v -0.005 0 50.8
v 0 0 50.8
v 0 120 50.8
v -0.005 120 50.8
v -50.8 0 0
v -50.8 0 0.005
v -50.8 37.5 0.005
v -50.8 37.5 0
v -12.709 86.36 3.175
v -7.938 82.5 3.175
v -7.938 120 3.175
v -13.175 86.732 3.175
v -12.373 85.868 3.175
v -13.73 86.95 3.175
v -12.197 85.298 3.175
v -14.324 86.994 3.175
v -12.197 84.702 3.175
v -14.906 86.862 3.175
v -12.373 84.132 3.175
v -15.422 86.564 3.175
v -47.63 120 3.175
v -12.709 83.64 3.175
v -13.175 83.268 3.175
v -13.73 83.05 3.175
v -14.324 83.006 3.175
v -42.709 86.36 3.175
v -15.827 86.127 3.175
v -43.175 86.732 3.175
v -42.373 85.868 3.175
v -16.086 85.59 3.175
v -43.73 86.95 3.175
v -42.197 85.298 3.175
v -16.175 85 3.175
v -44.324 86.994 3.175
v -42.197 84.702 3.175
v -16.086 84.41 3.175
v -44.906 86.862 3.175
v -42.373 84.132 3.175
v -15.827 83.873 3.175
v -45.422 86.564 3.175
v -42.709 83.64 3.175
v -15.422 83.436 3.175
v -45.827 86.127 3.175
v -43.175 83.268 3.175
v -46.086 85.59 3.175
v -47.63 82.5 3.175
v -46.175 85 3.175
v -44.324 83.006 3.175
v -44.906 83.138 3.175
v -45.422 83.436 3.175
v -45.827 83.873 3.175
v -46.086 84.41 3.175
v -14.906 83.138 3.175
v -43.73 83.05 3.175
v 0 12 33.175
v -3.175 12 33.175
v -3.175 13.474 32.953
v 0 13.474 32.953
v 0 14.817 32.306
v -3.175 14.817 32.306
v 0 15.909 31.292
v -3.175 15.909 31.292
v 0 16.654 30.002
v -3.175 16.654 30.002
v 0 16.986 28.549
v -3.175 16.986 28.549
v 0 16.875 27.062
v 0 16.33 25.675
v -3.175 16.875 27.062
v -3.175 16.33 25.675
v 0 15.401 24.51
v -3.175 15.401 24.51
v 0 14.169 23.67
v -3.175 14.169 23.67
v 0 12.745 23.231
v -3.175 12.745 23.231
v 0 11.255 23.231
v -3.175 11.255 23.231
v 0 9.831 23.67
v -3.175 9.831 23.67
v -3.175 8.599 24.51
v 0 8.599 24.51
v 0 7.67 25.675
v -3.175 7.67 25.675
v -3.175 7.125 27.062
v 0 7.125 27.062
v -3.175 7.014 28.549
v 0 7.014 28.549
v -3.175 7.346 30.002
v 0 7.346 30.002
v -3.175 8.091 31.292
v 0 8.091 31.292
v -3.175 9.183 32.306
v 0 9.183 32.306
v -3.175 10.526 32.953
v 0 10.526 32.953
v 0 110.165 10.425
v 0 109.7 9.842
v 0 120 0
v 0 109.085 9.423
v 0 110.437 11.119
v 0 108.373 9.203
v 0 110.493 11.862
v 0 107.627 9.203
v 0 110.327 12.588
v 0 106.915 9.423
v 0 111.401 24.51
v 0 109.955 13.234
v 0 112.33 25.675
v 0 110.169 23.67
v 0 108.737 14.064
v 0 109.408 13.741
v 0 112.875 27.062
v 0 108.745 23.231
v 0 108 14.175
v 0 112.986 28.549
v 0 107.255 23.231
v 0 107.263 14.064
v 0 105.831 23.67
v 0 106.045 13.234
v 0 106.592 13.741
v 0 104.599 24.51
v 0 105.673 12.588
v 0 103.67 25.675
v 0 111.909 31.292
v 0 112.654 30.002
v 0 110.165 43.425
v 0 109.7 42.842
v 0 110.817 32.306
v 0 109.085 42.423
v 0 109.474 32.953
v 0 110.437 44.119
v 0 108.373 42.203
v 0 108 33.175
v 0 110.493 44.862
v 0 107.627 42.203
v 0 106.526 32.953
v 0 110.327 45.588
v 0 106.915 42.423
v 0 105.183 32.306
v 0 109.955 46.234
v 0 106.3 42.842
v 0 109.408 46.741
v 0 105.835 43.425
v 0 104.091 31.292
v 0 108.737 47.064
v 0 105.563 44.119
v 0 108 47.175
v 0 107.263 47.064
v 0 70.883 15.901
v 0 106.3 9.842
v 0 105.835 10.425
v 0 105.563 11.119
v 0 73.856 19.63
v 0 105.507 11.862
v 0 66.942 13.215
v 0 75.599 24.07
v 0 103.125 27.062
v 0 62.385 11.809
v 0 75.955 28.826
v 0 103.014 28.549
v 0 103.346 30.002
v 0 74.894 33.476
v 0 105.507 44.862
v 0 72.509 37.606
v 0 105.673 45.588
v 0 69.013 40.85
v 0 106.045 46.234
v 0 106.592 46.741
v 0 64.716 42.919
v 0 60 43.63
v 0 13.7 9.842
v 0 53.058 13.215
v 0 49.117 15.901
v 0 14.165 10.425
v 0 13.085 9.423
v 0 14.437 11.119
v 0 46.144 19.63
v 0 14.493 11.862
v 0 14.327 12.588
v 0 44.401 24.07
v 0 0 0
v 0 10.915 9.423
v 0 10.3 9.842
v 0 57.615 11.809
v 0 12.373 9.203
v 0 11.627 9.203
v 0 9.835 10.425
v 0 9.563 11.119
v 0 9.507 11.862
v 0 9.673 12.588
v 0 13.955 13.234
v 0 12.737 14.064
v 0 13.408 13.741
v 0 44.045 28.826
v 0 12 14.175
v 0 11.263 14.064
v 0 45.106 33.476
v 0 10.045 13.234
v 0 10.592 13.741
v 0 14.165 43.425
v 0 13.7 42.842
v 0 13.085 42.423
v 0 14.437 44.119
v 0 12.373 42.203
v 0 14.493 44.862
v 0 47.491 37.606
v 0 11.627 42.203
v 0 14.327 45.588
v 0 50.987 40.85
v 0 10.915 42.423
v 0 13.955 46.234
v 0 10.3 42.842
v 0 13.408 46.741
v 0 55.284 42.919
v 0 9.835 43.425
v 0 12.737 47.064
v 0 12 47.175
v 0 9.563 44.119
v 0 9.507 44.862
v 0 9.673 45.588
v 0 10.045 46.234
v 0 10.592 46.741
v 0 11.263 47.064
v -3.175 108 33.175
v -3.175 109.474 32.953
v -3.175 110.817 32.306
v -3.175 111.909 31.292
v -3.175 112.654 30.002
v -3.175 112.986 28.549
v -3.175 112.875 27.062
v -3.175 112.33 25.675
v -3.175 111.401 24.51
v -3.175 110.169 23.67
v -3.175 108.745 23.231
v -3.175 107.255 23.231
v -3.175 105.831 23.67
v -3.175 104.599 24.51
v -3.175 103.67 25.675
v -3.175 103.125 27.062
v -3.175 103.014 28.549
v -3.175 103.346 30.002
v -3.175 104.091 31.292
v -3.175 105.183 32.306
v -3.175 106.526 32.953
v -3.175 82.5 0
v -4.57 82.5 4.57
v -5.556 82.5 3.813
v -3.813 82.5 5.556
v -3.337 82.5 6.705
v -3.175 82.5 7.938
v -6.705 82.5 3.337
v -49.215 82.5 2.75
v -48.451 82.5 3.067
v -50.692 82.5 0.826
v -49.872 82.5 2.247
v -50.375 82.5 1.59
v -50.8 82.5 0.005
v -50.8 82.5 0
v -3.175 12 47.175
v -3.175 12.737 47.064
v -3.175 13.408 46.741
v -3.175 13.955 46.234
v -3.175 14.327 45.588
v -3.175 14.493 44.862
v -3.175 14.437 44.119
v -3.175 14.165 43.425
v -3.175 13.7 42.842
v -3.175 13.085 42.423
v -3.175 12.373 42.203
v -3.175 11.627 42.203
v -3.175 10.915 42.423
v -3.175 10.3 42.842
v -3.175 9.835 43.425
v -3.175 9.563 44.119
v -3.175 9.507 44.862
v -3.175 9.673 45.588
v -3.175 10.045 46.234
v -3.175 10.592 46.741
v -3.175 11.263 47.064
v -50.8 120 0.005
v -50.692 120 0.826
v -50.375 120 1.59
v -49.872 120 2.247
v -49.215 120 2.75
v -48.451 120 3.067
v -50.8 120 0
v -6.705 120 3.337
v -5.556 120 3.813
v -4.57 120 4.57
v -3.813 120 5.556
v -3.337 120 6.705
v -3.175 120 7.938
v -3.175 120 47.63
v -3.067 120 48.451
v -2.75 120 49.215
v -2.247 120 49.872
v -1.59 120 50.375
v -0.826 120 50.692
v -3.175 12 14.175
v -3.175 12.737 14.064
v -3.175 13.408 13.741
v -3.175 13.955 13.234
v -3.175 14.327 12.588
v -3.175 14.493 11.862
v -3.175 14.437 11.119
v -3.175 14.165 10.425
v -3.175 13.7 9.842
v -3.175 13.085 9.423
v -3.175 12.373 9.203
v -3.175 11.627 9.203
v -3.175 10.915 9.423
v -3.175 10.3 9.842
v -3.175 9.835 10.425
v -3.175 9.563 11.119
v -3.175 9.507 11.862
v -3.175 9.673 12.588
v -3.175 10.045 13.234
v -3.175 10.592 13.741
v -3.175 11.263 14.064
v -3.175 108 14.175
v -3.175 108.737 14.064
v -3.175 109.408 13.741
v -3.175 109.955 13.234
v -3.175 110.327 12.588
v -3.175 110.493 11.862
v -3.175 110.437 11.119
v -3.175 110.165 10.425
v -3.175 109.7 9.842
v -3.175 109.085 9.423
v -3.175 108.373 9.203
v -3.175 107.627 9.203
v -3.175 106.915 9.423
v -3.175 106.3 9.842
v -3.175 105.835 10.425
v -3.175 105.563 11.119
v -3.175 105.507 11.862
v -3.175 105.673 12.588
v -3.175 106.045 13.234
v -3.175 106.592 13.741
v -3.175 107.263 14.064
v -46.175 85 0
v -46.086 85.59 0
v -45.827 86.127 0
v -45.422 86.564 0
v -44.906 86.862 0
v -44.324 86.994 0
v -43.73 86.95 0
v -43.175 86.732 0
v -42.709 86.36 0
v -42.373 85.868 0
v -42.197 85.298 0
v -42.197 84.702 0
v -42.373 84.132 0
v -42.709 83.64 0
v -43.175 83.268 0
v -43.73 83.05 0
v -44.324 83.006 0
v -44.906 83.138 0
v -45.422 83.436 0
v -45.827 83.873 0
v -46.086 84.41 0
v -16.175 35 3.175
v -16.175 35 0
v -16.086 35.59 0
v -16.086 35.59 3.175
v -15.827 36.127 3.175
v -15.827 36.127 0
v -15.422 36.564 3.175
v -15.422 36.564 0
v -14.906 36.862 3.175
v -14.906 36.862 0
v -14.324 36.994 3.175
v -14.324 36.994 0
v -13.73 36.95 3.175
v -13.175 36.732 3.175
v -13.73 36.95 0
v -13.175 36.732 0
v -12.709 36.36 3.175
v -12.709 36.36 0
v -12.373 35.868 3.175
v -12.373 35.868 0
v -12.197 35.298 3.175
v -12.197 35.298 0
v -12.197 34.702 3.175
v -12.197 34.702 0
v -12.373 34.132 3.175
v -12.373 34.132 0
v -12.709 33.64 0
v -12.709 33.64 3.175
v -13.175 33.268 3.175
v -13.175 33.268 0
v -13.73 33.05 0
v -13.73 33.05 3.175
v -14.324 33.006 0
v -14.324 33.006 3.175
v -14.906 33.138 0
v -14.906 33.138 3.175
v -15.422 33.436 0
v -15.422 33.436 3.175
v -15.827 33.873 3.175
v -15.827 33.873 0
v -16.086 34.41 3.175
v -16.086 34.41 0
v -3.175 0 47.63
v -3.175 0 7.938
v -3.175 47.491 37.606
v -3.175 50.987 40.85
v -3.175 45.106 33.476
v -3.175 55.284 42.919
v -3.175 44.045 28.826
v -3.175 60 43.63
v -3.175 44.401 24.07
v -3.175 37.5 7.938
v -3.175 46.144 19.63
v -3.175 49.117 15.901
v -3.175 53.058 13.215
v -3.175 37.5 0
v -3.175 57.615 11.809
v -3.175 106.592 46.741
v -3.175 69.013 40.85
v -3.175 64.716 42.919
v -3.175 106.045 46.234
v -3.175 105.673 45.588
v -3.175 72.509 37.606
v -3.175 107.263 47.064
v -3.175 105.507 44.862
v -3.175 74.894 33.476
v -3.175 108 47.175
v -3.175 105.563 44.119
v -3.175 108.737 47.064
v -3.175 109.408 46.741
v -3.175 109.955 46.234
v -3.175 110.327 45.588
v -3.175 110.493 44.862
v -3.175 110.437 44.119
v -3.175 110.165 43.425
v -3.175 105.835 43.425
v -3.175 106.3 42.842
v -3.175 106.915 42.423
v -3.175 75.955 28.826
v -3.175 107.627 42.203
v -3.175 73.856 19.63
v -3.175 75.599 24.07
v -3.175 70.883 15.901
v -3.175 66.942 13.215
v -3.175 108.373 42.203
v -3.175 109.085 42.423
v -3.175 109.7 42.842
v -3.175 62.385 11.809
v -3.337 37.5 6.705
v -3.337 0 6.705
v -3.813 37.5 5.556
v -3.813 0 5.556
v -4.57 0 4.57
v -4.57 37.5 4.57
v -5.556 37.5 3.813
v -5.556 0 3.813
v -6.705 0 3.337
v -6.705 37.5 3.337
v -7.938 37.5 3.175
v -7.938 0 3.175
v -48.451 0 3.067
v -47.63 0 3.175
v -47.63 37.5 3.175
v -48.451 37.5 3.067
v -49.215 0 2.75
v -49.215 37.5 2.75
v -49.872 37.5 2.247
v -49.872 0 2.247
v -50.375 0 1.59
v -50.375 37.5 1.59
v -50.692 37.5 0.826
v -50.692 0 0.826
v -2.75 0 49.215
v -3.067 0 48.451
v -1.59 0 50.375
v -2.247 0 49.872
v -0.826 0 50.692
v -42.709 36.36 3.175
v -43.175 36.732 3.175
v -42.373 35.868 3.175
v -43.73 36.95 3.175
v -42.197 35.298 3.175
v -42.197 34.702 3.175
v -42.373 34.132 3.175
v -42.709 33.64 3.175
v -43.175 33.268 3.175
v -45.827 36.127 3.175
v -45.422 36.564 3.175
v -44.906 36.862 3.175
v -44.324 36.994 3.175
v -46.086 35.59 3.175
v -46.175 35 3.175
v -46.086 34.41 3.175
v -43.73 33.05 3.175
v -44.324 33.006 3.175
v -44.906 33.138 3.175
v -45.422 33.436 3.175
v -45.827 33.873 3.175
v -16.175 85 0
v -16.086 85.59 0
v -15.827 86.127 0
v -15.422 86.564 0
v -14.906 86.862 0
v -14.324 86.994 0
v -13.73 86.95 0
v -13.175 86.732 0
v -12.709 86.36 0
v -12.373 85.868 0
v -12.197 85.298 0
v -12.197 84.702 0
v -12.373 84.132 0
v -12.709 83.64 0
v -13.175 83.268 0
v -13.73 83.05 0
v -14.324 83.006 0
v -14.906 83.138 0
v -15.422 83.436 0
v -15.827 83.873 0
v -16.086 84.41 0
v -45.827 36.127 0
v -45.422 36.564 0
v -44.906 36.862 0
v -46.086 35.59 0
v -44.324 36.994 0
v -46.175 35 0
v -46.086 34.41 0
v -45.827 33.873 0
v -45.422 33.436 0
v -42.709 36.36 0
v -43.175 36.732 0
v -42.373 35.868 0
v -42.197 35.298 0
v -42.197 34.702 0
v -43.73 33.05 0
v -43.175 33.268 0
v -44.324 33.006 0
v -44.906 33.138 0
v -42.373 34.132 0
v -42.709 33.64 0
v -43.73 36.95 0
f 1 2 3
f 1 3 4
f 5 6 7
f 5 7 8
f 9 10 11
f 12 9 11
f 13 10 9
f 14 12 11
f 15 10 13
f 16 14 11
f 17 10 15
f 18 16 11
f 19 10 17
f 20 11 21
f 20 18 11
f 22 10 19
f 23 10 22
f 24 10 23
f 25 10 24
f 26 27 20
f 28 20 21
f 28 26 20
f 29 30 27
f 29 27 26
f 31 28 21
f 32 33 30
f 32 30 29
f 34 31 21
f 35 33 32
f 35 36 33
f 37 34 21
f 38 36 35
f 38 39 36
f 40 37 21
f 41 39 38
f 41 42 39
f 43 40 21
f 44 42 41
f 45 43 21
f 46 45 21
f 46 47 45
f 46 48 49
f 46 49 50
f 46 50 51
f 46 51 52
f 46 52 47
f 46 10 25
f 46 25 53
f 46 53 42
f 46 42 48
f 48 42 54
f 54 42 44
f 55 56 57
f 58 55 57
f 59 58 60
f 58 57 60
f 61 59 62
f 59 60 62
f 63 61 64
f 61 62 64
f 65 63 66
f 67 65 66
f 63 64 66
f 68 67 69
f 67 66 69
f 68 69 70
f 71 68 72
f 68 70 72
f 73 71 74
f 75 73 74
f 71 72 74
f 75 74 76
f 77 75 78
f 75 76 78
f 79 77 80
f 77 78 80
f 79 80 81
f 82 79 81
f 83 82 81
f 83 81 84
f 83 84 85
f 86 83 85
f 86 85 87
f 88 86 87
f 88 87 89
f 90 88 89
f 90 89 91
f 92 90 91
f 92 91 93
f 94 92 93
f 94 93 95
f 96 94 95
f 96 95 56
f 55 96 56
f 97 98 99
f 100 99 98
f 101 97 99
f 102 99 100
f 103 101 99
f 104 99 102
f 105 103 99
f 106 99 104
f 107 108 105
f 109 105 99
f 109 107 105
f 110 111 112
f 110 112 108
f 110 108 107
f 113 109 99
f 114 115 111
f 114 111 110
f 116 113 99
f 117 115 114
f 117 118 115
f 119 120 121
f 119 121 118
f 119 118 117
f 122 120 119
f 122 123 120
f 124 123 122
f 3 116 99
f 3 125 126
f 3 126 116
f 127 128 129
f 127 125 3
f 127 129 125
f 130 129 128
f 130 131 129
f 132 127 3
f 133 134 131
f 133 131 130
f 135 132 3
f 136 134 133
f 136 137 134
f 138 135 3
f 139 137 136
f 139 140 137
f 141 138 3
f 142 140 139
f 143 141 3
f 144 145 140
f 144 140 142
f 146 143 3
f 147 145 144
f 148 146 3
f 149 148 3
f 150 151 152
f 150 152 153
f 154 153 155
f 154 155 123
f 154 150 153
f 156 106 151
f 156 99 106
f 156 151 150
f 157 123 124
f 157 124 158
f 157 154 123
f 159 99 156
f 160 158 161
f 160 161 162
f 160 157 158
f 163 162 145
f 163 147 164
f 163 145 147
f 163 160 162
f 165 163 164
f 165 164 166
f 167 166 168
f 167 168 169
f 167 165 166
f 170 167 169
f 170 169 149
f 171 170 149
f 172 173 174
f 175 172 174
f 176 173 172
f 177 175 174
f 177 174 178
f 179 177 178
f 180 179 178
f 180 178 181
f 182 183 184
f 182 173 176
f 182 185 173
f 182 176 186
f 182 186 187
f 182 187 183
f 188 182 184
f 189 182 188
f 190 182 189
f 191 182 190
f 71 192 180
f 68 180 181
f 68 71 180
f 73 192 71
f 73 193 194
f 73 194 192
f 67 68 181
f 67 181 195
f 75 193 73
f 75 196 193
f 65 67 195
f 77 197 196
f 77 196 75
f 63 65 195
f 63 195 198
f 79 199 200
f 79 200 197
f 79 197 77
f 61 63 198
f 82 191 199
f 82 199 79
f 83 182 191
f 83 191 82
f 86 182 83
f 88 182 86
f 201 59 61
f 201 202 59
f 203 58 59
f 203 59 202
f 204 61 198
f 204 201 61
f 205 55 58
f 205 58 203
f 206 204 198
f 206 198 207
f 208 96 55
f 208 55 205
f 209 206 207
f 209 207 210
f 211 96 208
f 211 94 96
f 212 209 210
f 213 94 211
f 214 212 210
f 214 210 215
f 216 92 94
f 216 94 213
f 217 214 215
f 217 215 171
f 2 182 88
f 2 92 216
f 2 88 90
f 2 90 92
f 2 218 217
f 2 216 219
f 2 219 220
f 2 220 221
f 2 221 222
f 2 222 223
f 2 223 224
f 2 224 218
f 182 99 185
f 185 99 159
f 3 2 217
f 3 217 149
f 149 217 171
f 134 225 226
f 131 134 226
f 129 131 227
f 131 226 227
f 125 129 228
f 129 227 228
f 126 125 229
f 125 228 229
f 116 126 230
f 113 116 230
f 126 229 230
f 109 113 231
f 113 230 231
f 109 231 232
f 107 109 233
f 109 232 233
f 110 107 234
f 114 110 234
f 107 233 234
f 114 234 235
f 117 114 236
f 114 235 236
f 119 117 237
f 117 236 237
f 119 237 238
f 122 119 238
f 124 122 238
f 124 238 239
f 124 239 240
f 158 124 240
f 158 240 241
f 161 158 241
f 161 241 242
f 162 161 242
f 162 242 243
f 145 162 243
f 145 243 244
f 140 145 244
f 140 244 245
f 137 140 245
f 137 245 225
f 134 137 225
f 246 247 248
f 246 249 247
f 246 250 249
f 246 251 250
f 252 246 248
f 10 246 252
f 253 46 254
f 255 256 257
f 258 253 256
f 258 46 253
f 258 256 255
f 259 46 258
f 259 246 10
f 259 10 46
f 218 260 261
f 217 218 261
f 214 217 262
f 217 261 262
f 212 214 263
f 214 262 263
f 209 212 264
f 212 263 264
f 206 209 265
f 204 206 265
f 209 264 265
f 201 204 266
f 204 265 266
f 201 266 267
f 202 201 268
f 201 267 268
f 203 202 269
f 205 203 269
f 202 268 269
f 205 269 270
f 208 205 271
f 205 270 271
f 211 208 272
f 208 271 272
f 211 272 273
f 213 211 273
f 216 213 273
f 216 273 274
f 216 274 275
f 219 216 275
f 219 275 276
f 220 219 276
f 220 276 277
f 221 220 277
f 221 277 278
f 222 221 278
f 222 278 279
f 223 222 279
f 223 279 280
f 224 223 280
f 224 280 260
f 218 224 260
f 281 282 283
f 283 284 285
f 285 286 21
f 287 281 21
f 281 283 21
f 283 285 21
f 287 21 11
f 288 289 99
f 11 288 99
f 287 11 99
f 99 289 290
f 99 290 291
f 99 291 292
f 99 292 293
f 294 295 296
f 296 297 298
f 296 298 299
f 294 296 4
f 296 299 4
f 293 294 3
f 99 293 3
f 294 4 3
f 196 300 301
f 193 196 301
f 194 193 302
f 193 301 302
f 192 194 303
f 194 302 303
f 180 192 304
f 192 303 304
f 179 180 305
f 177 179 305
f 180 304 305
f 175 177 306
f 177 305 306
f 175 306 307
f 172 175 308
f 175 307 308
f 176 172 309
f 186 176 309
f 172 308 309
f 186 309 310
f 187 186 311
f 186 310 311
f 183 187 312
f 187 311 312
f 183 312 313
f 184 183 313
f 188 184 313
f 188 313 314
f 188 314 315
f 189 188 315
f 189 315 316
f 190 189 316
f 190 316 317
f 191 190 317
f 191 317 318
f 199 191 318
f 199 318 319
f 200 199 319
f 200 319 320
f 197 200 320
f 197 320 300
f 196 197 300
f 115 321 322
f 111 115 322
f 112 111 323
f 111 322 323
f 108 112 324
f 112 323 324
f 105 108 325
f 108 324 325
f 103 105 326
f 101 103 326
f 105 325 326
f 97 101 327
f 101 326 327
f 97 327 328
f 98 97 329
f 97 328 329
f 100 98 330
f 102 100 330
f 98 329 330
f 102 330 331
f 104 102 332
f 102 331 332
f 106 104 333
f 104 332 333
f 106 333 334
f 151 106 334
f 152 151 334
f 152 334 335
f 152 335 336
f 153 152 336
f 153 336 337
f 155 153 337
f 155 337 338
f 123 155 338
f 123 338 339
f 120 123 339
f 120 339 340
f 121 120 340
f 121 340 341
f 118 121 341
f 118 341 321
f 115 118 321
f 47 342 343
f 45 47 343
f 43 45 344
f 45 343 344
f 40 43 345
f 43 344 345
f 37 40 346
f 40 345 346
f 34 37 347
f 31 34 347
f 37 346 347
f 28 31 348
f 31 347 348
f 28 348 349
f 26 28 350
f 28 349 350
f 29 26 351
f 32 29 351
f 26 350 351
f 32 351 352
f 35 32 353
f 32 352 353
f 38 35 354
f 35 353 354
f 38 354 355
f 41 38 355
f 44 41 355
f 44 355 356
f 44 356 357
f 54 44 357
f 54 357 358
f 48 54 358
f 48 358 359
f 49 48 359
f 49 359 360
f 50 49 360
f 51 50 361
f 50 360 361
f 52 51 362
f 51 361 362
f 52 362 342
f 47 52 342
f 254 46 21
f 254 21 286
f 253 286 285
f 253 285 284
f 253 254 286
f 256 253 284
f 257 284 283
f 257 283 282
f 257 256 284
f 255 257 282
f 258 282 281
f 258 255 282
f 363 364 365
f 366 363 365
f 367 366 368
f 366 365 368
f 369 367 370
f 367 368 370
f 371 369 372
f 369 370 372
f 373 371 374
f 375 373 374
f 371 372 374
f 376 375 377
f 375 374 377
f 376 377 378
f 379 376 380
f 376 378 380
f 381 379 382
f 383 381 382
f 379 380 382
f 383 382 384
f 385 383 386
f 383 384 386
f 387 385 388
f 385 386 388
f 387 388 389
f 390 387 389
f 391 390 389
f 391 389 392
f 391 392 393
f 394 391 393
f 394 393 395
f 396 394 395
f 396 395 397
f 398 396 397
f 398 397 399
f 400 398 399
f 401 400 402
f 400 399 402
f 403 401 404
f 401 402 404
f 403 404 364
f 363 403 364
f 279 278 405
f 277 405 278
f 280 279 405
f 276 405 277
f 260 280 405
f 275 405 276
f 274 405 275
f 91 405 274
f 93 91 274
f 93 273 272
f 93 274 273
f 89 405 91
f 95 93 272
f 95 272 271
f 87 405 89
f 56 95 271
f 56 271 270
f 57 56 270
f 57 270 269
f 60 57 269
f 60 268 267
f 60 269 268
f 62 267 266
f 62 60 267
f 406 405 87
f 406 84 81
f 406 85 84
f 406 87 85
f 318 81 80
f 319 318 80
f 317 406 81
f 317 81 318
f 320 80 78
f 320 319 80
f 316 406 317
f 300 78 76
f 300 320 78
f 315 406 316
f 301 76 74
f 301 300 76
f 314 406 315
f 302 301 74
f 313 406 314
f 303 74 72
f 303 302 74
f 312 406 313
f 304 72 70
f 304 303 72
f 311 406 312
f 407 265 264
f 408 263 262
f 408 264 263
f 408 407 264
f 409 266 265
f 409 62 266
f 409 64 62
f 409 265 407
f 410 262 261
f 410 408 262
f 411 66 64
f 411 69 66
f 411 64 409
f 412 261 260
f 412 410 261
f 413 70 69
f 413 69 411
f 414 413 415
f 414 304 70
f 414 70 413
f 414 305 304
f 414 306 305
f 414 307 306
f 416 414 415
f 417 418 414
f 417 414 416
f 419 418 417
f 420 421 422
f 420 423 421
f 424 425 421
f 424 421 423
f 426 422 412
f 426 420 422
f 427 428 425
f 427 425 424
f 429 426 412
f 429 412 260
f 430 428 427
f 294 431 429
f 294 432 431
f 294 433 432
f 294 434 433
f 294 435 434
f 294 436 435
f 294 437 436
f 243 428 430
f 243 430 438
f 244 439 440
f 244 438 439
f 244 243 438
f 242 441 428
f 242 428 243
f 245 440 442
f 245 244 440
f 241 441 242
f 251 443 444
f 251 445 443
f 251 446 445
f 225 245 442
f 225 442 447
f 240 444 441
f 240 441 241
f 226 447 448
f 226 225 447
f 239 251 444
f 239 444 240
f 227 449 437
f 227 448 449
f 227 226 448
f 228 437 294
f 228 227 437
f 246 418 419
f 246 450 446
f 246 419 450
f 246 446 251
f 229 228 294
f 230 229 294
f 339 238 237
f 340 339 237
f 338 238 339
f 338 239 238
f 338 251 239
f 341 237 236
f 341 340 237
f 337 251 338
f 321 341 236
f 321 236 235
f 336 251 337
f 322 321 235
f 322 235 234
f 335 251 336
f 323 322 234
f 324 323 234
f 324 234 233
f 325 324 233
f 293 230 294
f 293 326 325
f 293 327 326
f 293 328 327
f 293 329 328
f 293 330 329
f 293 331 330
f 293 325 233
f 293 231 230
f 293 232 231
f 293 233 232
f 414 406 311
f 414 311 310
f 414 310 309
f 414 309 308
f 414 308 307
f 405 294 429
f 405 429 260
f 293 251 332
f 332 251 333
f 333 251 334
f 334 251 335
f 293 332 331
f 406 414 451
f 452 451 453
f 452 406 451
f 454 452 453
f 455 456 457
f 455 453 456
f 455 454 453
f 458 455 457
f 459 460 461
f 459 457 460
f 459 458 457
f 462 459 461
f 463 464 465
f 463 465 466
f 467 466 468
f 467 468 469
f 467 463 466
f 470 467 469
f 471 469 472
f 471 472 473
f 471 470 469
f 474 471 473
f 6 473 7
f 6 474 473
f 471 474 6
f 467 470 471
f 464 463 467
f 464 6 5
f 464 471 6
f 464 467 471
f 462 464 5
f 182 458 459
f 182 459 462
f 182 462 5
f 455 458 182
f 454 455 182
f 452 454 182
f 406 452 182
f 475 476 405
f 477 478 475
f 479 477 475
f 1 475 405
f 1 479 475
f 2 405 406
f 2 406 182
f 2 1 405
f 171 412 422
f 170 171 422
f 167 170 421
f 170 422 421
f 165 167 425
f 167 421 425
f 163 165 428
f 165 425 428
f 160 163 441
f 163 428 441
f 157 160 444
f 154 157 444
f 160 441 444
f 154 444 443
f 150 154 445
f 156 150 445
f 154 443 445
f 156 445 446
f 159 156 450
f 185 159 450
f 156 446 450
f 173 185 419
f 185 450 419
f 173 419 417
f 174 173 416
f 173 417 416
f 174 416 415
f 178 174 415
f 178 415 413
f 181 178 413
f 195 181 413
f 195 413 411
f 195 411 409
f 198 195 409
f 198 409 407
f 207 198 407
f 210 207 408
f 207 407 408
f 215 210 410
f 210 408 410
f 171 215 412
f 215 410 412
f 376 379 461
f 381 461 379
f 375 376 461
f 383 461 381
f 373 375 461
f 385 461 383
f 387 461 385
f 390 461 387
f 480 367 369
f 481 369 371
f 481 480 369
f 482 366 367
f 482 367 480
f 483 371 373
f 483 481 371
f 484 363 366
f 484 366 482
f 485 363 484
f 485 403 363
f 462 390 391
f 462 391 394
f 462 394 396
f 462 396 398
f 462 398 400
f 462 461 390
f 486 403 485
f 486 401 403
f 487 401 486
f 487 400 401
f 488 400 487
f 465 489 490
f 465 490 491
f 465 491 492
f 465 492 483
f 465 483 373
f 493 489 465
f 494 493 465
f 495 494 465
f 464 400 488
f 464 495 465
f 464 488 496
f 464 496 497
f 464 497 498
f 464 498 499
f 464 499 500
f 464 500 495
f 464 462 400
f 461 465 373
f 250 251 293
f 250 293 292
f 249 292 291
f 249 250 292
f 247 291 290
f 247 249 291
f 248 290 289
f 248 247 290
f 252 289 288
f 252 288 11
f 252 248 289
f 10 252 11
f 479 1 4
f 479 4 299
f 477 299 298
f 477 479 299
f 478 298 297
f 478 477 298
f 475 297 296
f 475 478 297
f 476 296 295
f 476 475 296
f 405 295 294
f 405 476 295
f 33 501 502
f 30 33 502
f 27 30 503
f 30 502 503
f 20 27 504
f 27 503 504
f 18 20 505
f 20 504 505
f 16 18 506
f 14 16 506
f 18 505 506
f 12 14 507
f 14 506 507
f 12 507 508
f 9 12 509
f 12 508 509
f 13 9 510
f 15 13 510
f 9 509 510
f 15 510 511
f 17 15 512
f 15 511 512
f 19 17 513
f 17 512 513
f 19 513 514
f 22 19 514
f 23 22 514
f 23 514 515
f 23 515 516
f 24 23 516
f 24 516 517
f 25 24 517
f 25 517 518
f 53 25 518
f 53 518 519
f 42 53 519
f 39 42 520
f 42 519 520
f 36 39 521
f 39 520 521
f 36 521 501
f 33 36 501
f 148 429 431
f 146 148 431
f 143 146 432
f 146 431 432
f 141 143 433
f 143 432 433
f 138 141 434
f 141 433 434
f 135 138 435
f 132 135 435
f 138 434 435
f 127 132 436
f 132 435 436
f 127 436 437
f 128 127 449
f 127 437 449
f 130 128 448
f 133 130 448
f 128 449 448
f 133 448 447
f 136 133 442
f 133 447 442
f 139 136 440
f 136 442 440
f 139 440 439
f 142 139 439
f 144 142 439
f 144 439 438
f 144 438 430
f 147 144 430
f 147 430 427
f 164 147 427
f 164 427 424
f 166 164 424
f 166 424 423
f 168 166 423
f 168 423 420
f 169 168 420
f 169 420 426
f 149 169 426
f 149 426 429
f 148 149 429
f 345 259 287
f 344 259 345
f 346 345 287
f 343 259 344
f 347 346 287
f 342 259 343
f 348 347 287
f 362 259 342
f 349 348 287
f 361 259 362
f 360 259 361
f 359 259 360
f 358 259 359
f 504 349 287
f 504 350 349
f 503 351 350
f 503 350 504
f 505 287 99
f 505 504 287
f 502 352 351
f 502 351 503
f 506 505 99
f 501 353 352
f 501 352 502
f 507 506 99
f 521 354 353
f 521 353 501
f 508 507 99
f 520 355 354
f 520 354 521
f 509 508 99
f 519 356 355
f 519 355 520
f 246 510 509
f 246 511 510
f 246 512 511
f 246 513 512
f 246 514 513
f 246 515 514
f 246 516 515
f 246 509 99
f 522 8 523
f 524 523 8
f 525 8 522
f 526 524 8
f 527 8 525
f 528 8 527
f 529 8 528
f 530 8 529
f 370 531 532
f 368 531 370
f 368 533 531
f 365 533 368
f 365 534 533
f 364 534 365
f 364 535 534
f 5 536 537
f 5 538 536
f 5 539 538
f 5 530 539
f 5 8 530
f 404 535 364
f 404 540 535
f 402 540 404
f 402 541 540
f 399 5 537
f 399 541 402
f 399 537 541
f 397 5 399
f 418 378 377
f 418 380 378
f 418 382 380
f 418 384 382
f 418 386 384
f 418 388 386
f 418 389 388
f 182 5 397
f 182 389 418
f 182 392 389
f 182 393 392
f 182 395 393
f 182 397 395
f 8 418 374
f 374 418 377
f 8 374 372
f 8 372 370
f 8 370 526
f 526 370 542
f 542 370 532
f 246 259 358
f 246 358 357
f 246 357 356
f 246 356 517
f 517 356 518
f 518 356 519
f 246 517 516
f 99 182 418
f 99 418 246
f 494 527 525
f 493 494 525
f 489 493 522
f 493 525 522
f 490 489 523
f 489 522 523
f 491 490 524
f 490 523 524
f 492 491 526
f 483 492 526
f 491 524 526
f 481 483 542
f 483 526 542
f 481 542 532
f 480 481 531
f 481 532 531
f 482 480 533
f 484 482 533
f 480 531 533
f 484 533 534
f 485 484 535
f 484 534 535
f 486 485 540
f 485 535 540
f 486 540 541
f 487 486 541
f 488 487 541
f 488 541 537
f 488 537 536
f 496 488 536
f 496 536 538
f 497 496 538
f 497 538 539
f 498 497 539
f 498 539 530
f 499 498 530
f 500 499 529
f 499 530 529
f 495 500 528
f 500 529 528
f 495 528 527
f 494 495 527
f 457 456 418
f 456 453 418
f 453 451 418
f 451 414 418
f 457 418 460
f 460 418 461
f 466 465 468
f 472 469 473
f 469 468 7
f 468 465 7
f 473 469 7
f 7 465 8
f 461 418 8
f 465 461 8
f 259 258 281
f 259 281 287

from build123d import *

# Parameters (mm, degrees)
HIERRO_ANGULAR_2_X_2_X_0_125_1_DEPTH = 120
CROQUIS3_W                           = 47.625
CROQUIS3_H                           = 45
CORTAR_EXTRUIR1_DEPTH                = 10
CROQUIS4_R                           = 5
CROQUIS4_R_2                         = 2.5
CORTAR_EXTRUIR2_DEPTH                = 10
CROQUIS5_R                           = 16
CORTAR_EXTRUIR3_DEPTH                = 3.175
CROQUIS6_R                           = 2
CORTAR_EXTRUIR4_DEPTH                = 3.175


with BuildPart() as part:
    # Sketch1 → Hierro angular 2 X 2 X 0.125(1) (new body)
    with BuildSketch(Plane(origin=(0, 0, 0), x_dir=(-1, 0, 0), z_dir=(0, 1, 0))):
        with BuildLine():
            Line((0, 0), (0, 50.8))
            Line((0, 50.8), (0.00508, 50.8))
            ThreePointArc((0.00508, 50.8), (2.246551928, 49.871551928), (3.175, 47.63008))
            Line((3.175, 47.63008), (3.175, 7.9375))
            ThreePointArc((3.175, 7.9375), (4.569903955, 4.569903955), (7.9375, 3.175))
            Line((7.9375, 3.175), (47.63008, 3.175))
            ThreePointArc((47.63008, 3.175), (49.871551928, 2.246551928), (50.8, 0.00508))
            Line((50.8, 0.00508), (50.8, 0))
            Line((50.8, 0), (0, 0))
        make_face()
    extrude(amount=HIERRO_ANGULAR_2_X_2_X_0_125_1_DEPTH)

    # Croquis3 → Cortar-Extruir1 (cut)
    with BuildSketch(Plane(origin=(0, 0, 0), x_dir=(-1, 0, 0), z_dir=(0, 0, -1))):
        with Locations((26.9875, 60)):
            Rectangle(CROQUIS3_W, CROQUIS3_H)
    extrude(amount=-CORTAR_EXTRUIR1_DEPTH, mode=Mode.SUBTRACT)

    # Croquis4 → Cortar-Extruir2 (cut)
    with BuildSketch(Plane.ZY.offset(3.175)):
        with Locations((28.175, 12)):
            Circle(CROQUIS4_R)
        with Locations((11.675, 12)):
            Circle(CROQUIS4_R_2)
        with Locations((44.675, 12)):
            Circle(CROQUIS4_R_2)
        with Locations((44.675, 108)):
            Circle(CROQUIS4_R_2)
        with Locations((28.175, 108)):
            Circle(CROQUIS4_R)
        with Locations((11.675, 108)):
            Circle(CROQUIS4_R_2)
    extrude(amount=-CORTAR_EXTRUIR2_DEPTH, mode=Mode.SUBTRACT)

    # Croquis5 → Cortar-Extruir3 (cut)
    with BuildSketch(Plane.ZY.offset(3.175)):
        with Locations((27.63008, 60)):
            Circle(CROQUIS5_R)
    extrude(amount=-CORTAR_EXTRUIR3_DEPTH, mode=Mode.SUBTRACT)

    # Croquis6 → Cortar-Extruir4 (cut)
    with BuildSketch(Plane(origin=(0, 0, 0), x_dir=(-1, 0, 0), z_dir=(0, 0, -1))):
        with Locations((14.175, 35)):
            Circle(CROQUIS6_R)
        with Locations((14.175, 85)):
            Circle(CROQUIS6_R)
        with Locations((44.175, 85)):
            Circle(CROQUIS6_R)
        with Locations((44.175, 35)):
            Circle(CROQUIS6_R)
    extrude(amount=-CORTAR_EXTRUIR4_DEPTH, mode=Mode.SUBTRACT)


solid = part.part
